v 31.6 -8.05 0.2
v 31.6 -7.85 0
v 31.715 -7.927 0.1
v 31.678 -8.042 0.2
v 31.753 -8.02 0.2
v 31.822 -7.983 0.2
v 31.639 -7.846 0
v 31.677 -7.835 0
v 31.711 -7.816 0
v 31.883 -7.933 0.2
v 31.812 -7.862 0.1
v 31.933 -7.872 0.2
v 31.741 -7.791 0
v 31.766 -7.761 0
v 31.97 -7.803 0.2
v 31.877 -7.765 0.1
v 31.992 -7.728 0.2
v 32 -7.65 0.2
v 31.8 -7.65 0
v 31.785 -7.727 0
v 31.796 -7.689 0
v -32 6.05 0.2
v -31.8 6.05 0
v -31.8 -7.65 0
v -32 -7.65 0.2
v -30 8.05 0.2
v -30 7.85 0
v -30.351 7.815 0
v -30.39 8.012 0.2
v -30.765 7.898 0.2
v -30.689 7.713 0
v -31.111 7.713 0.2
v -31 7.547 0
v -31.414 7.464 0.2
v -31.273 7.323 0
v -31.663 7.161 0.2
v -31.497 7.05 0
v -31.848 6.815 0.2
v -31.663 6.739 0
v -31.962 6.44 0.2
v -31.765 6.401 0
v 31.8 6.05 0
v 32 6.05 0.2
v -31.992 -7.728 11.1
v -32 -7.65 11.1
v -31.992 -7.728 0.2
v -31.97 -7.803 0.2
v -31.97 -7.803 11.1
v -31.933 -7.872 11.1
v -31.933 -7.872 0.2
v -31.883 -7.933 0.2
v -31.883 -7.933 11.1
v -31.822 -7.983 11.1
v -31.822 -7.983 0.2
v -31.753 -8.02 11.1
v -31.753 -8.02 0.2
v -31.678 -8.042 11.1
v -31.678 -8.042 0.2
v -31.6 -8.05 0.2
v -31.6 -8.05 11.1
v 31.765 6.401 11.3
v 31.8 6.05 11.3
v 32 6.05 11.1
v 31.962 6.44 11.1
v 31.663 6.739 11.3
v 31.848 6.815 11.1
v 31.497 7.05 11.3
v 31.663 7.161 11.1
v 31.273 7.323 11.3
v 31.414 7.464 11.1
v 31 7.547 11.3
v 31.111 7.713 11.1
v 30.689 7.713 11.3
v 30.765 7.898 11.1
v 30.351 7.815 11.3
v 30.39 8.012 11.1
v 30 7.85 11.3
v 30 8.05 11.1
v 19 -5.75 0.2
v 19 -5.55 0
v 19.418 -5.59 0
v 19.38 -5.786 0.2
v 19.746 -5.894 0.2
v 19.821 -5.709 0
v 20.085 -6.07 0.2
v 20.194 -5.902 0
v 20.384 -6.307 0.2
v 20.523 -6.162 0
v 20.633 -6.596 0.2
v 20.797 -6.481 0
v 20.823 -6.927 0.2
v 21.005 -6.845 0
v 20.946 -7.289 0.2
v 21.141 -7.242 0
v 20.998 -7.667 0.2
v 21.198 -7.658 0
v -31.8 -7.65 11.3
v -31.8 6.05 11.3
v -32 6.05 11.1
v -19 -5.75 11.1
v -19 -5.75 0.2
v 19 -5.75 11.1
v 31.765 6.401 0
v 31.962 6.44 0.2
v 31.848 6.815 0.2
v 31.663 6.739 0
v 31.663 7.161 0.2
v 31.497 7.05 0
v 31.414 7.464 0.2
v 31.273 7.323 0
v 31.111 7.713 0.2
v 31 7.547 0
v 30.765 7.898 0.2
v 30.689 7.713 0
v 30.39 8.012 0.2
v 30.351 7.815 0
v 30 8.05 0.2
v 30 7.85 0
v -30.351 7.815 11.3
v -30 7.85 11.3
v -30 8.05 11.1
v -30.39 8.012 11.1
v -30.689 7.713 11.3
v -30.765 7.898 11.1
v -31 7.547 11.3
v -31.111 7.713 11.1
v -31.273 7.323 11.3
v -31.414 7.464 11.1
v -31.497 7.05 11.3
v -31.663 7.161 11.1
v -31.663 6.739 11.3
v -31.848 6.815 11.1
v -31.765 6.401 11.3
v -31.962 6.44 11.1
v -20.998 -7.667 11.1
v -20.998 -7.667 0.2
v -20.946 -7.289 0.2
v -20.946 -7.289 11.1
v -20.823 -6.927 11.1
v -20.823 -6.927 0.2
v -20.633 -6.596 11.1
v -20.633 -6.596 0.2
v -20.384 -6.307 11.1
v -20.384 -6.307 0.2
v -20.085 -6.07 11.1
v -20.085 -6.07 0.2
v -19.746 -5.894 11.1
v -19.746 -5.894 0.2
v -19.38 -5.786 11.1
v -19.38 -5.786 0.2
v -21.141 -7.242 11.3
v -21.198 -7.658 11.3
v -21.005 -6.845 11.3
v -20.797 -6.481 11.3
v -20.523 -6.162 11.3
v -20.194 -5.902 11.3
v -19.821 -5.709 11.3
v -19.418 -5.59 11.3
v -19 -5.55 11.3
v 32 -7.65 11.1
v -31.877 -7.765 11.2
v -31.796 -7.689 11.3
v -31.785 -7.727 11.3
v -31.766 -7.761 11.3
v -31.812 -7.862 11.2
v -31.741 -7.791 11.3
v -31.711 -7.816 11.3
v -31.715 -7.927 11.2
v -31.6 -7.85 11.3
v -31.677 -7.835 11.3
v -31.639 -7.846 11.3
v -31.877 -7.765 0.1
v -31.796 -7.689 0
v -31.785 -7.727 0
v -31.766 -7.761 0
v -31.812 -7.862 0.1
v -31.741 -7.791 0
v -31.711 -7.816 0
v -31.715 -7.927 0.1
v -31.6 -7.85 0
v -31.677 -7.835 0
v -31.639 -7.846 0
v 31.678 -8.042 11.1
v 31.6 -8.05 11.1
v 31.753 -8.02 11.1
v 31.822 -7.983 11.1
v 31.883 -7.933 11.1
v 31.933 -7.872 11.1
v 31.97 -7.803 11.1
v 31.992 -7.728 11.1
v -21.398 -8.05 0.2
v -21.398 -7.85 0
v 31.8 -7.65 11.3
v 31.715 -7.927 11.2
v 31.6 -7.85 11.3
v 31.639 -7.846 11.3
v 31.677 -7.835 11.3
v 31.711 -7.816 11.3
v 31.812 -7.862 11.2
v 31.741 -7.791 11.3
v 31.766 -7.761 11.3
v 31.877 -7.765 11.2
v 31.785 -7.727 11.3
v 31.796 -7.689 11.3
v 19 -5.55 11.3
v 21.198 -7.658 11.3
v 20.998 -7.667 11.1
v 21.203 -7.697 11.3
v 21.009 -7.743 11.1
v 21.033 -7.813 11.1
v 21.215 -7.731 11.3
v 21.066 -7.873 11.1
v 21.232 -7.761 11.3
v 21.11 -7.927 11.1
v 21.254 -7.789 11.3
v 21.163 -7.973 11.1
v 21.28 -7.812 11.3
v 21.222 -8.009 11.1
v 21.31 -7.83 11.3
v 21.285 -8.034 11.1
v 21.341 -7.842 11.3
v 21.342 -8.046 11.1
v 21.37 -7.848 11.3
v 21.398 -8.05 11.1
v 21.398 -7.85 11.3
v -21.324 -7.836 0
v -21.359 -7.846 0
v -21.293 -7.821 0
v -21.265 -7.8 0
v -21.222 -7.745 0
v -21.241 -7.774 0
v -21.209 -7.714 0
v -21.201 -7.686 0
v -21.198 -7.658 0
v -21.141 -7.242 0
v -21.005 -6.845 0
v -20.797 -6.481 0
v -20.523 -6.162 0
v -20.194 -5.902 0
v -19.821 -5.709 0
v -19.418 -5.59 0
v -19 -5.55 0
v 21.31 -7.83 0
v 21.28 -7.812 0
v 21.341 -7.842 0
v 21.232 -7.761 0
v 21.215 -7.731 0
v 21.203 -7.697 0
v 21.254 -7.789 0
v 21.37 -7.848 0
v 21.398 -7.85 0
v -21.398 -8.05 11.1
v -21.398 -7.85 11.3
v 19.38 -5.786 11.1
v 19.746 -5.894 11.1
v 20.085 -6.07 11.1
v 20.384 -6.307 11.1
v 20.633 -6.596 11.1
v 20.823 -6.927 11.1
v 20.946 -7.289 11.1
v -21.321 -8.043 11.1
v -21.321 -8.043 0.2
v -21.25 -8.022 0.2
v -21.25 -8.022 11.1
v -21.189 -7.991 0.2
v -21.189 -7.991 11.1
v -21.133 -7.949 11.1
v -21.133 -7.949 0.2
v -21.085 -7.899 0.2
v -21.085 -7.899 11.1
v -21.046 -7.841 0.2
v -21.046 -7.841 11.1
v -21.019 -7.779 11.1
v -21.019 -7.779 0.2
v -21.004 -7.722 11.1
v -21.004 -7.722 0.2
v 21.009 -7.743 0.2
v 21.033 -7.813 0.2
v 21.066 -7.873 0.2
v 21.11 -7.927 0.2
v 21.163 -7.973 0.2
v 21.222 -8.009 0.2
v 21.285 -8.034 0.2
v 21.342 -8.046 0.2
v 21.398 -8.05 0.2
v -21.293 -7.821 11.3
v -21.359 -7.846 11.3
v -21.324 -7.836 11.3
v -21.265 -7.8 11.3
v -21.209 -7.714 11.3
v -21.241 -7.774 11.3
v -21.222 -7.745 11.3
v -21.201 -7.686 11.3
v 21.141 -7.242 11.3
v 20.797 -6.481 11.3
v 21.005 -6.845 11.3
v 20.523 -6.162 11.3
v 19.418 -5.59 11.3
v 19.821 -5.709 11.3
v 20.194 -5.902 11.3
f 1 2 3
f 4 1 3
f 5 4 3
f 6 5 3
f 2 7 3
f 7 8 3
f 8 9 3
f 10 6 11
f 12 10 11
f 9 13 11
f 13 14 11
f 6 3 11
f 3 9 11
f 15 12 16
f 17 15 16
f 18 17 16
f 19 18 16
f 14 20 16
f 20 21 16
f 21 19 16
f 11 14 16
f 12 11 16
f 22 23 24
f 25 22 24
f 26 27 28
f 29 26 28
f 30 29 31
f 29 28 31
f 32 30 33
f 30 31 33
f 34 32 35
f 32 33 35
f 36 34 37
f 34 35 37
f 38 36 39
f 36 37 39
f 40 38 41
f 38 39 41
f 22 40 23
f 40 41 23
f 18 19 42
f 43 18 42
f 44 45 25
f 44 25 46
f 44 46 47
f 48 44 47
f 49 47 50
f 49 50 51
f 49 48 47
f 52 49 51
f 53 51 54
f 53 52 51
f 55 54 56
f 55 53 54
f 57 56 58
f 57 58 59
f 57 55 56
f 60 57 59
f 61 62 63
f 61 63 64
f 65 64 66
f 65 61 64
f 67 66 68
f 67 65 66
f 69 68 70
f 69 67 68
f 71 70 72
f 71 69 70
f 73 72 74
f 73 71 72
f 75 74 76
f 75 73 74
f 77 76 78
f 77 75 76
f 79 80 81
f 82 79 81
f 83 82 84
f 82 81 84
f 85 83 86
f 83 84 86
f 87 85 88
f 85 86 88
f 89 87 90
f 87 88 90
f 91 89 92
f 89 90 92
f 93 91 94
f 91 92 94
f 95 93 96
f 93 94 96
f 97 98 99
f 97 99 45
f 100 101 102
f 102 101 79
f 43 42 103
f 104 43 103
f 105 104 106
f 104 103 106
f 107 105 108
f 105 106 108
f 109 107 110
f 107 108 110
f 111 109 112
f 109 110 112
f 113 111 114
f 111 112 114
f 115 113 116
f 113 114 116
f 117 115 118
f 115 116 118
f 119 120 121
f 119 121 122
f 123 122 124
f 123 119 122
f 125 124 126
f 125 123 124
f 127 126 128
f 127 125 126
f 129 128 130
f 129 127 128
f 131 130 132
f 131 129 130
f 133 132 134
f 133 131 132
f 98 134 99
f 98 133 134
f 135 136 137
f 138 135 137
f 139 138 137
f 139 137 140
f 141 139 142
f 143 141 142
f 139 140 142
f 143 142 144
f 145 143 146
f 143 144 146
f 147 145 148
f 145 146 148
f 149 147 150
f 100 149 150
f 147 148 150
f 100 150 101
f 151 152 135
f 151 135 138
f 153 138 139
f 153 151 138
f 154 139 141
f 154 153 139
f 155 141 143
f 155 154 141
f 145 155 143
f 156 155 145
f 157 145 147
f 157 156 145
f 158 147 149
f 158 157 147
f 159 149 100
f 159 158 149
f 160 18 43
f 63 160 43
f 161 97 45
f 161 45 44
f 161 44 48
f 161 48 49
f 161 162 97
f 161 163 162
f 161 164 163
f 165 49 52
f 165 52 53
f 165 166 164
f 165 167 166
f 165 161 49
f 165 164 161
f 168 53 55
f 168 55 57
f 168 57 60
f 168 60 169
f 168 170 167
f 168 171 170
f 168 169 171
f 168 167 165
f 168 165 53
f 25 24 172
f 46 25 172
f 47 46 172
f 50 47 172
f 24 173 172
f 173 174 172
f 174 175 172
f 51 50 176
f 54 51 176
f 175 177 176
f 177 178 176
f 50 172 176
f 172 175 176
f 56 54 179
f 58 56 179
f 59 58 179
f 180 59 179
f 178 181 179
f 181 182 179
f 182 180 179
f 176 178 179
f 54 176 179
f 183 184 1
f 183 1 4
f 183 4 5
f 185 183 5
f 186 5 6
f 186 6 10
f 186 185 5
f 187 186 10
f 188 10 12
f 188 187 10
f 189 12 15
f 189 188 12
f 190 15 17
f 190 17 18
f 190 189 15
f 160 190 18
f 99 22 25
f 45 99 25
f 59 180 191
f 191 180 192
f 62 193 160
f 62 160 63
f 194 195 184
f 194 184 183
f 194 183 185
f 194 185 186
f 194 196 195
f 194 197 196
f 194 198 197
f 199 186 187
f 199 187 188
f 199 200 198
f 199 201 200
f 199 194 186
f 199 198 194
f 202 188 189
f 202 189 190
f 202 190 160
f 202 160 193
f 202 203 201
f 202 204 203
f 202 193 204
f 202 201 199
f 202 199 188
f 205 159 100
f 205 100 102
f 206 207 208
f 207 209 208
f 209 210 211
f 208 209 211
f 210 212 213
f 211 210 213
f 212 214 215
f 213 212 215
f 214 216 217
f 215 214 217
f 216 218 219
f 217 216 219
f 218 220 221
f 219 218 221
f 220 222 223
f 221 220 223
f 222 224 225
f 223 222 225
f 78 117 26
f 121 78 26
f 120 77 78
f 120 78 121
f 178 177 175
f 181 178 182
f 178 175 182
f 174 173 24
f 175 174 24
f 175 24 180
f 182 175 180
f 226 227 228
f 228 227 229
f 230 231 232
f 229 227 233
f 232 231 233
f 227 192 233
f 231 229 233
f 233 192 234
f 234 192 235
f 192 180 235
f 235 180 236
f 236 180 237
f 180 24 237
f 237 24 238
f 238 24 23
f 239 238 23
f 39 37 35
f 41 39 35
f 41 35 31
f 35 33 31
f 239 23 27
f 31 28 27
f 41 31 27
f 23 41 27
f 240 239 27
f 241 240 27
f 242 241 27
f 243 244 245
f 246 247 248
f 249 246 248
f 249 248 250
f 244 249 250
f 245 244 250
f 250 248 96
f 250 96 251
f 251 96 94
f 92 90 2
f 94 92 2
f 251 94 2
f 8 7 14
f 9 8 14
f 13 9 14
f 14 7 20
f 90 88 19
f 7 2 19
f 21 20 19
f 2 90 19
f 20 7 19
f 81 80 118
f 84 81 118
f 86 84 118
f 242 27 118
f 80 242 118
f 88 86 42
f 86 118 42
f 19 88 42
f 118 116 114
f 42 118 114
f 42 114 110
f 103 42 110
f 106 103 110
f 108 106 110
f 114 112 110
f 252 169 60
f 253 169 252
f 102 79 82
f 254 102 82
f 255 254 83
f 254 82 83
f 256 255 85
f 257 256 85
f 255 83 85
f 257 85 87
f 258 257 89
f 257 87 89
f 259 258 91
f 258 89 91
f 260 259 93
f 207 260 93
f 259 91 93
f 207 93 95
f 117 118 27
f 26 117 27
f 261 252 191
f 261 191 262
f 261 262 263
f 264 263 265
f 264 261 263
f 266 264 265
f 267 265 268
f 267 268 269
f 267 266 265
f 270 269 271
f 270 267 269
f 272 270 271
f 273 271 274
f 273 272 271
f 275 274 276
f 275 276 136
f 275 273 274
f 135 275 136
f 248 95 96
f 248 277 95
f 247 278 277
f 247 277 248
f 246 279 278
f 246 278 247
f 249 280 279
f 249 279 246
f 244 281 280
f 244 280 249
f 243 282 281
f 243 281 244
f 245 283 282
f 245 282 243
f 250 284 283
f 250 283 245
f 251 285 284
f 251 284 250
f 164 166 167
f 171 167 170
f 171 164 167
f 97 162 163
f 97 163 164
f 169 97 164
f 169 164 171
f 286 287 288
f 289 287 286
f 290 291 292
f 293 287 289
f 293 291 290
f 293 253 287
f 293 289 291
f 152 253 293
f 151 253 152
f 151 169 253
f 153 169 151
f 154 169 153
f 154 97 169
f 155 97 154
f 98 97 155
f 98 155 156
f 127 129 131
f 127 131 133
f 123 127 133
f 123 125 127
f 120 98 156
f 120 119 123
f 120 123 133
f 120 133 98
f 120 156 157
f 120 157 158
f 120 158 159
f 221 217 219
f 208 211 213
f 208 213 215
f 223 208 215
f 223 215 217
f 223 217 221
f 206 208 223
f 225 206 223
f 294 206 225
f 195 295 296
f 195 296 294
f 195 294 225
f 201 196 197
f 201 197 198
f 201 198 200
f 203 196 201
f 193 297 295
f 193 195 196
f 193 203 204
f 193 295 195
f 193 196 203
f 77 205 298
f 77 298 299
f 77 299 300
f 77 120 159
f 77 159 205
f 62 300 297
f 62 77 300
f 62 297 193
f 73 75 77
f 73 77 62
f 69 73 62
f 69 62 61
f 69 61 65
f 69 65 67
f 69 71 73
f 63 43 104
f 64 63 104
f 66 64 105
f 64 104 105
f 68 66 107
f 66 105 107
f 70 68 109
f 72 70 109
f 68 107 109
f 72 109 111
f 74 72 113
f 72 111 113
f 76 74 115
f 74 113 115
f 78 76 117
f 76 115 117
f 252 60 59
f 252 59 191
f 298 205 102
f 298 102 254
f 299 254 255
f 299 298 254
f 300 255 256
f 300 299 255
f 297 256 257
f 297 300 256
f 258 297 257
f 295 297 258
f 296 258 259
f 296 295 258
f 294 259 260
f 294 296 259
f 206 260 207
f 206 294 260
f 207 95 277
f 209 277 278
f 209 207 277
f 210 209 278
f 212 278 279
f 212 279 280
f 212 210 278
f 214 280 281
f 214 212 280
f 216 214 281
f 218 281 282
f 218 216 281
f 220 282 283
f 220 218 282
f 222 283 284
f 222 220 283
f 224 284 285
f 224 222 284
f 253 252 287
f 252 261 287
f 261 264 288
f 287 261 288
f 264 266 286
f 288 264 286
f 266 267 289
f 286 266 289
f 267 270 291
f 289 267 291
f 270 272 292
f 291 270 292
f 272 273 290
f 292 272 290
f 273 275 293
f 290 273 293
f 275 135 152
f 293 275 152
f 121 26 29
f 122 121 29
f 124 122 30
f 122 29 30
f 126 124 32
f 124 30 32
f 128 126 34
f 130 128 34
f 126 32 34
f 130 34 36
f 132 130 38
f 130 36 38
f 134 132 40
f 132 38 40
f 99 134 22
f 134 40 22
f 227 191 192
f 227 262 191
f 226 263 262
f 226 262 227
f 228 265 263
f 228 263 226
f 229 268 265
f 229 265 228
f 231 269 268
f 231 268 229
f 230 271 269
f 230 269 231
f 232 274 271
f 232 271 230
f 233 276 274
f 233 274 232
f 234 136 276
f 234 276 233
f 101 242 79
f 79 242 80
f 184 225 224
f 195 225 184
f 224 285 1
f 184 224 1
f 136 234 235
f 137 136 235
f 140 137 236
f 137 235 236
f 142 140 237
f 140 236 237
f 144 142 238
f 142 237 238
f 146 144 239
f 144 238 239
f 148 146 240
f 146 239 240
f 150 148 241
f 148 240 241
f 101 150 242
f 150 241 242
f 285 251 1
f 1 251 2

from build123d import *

# Parameters (mm, degrees)
F1_DEPTH = 11.3
F2_R     = 0.4
F3_SIZE  = 0.2


with BuildPart() as f1:
    # F0 (on Top) → F1 (new body)
    with BuildSketch(Plane.XY):
        with BuildLine():
            Line((-32, 6.05), (-32, -8.05))
            Line((-32, -8.05), (-21, -8.05))
            Line((-21, -8.05), (-21, -7.75))
            ThreePointArc((-21, -7.75), (-20.414214, -6.335786), (-19, -5.75))
            Line((-19, -5.75), (19, -5.75))
            ThreePointArc((19, -5.75), (20.414214, -6.335786), (21, -7.75))
            Line((21, -7.75), (21, -8.05))
            Line((21, -8.05), (32, -8.05))
            Line((32, -8.05), (32, 6.05))
            ThreePointArc((32, 6.05), (31.414214, 7.464214), (30, 8.05))
            Line((30, 8.05), (-30, 8.05))
            ThreePointArc((-30, 8.05), (-31.414214, 7.464214), (-32, 6.05))
        make_face()
    extrude(amount=F1_DEPTH)

    # F2
    f2_edges = [f1.edges().sort_by_distance(p)[0] for p in [
        (-32, -8.05, 5.65),
        (-21, -8.05, 5.65),
        (21, -8.05, 5.65),
        (32, -8.05, 5.65),
    ]]
    fillet(f2_edges, radius=F2_R)

    # F3
    f3_edges = [f1.edges().sort_by_distance(p)[0] for p in [
        (-32, -0.8, 0),
        (-31.882843, -7.932843, 0),
        (-31.414214, 7.464214, 0),
        (-26.498958, -8.05, 0),
        (0, 8.05, 0),
        (-21.121028, -7.938675, 0),
        (31.414214, 7.464214, 0),
        (-20.384437, -6.306624, 0),
        (32, -0.8, 0),
        (0, -5.75, 0),
        (31.882843, -7.932843, 0),
        (20.384437, -6.306624, 0),
        (26.498958, -8.05, 0),
        (21.121028, -7.938675, 0),
        (-32, -0.8, 11.3),
        (-31.882843, -7.932843, 11.3),
        (-31.414214, 7.464214, 11.3),
        (-26.498958, -8.05, 11.3),
        (0, 8.05, 11.3),
        (-21.121028, -7.938675, 11.3),
        (31.414214, 7.464214, 11.3),
        (-20.384437, -6.306624, 11.3),
        (32, -0.8, 11.3),
        (0, -5.75, 11.3),
        (31.882843, -7.932843, 11.3),
        (20.384437, -6.306624, 11.3),
        (26.498958, -8.05, 11.3),
        (21.121028, -7.938675, 11.3),
    ]]
    chamfer(f3_edges, length=F3_SIZE)


solid = f1.part
